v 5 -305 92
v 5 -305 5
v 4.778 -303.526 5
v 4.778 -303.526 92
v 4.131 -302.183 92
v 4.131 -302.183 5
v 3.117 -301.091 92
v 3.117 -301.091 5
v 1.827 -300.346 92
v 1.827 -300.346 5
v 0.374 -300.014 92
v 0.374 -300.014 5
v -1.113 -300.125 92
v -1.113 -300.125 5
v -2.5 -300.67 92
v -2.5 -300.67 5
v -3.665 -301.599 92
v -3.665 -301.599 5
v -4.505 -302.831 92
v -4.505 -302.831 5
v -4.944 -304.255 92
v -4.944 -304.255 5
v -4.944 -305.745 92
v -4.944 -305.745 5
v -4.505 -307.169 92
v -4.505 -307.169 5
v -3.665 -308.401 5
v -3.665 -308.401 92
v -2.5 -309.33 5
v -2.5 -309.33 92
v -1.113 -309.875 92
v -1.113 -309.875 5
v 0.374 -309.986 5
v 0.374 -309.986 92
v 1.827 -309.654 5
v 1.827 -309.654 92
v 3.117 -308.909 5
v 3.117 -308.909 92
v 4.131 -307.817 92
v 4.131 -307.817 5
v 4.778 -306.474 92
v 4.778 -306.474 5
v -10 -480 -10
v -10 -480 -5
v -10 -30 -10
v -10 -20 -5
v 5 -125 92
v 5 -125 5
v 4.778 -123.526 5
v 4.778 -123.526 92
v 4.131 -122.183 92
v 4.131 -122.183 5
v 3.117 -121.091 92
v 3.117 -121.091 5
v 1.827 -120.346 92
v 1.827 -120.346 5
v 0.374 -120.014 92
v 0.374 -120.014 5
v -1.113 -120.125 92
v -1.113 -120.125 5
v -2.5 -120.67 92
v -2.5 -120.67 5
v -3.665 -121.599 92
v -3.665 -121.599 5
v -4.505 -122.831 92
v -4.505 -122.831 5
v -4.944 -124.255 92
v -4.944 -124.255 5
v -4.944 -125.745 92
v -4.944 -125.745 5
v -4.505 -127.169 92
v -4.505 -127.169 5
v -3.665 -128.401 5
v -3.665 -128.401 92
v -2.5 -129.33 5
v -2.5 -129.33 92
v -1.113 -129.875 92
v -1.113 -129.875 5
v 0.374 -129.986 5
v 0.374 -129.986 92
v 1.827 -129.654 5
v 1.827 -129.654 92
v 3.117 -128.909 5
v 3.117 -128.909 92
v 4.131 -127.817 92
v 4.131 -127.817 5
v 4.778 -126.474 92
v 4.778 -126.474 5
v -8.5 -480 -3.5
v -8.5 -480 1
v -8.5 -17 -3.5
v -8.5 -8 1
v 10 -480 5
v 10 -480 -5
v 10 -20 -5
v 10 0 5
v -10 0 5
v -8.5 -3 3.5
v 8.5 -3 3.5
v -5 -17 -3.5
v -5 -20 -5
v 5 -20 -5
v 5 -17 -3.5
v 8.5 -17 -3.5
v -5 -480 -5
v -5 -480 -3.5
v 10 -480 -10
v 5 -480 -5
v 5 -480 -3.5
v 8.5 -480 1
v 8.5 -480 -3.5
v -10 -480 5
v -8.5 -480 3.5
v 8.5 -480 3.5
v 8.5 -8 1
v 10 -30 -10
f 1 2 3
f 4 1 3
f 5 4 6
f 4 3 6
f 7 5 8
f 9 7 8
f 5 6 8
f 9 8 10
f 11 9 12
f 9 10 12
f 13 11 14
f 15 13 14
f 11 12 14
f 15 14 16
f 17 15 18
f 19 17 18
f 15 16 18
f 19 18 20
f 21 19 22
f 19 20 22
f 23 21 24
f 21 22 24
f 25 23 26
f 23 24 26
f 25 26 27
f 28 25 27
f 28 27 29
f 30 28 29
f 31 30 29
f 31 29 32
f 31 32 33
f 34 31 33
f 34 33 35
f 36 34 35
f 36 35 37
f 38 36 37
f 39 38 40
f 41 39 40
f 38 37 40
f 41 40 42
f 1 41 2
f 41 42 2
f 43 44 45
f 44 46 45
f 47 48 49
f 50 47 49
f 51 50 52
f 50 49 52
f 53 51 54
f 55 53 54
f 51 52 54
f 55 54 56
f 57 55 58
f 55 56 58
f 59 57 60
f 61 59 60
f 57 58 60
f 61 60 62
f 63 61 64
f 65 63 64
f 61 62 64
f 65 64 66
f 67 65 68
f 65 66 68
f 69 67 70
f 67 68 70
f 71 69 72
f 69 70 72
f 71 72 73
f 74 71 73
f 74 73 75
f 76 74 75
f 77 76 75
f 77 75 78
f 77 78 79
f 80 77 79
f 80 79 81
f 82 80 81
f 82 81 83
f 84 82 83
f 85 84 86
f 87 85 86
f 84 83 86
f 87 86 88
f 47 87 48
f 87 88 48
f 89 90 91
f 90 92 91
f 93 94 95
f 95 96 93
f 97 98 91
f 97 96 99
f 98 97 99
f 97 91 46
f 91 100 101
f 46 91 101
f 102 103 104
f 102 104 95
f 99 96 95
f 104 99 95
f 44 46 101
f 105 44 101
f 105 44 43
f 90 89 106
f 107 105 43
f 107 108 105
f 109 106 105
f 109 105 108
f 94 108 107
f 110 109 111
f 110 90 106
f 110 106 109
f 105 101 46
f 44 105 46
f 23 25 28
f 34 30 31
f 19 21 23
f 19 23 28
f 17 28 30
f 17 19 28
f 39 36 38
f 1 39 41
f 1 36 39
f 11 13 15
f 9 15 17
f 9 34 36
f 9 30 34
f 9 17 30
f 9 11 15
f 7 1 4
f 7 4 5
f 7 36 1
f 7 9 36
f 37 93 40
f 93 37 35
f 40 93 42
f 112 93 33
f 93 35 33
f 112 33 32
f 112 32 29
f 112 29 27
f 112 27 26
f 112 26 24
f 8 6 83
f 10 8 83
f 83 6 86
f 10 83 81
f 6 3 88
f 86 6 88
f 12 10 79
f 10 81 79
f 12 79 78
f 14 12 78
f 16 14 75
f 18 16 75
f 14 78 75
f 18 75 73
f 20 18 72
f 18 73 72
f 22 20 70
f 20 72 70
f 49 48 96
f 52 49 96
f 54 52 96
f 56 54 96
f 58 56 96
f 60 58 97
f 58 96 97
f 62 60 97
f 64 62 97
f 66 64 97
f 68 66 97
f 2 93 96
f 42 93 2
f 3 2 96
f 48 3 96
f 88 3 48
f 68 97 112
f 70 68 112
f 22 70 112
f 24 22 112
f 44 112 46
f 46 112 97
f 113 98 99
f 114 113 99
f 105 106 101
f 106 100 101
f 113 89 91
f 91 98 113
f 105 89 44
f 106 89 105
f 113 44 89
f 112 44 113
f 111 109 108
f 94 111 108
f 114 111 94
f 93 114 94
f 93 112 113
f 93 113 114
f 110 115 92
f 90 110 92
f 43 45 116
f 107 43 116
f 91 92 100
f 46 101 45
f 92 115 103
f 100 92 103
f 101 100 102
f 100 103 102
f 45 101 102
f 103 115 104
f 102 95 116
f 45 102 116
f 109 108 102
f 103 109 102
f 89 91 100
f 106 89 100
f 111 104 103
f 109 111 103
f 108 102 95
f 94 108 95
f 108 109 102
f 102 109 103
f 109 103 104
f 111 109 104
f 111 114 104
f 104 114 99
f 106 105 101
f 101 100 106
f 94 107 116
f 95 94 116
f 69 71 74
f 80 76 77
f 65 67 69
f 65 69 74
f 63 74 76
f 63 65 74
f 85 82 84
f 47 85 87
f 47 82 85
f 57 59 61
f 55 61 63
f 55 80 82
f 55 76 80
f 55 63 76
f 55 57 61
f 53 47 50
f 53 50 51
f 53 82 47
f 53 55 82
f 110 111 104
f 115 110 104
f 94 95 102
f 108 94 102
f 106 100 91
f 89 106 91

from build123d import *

# Parameters (mm, degrees)
F1_DEPTH = 480
F3_DEPTH = 480
F5_DEPTH = 25
F6_R     = 5
F7_DEPTH = 87


with BuildPart() as f1:
    # F0 (on Front) → F1 (new body)
    with BuildSketch(Plane.XZ):
        Polygon((-10, 5), (-10, -5), (-5, -5), (-5, -3.5), (-8.5, -3.5), (-8.5, 3.5), (8.5, 3.5), (8.5, -3.5), (5, -3.5), (5, -5), (10, -5), (10, 5), align=None)
    extrude(amount=F1_DEPTH)


with BuildPart() as f3:
    # F2 (on face) → F3 (new body)
    with BuildSketch(Plane.XZ.offset(480)):
        Polygon((0, 1), (-8.5, 1), (-8.5, -3.5), (-5, -3.5), (-5, -5), (-10, -5), (-10, -10), (-8.5, -10), (0, -10), (8.5, -10), (10, -10), (10, -5), (5, -5), (5, -3.5), (8.5, -3.5), (8.5, 1), align=None)
    extrude(amount=-F3_DEPTH)


with BuildPart() as f5_tool:
    # F4 (on face) → F5 (new body)
    with BuildSketch(Plane.YZ.offset(10)):
        Polygon((0, -10), (0, 5), (-30, -10), align=None)
    extrude(amount=-F5_DEPTH)


with BuildPart() as f1_1:
    add(f1.part)

    # F5: cut by f5_tool
    add(f5_tool.part, mode=Mode.SUBTRACT)

    # F6 (on face) → F7 (join)
    with BuildSketch(Plane.XY.offset(5)):
        with Locations((0, -305)):
            Circle(F6_R)
        with Locations((0, -125)):
            Circle(F6_R)
    extrude(amount=F7_DEPTH)


with BuildPart() as f3_1:
    add(f3.part)

    # F5: cut by f5_tool
    add(f5_tool.part, mode=Mode.SUBTRACT)


solid = Compound([f1_1.part, f3_1.part])
